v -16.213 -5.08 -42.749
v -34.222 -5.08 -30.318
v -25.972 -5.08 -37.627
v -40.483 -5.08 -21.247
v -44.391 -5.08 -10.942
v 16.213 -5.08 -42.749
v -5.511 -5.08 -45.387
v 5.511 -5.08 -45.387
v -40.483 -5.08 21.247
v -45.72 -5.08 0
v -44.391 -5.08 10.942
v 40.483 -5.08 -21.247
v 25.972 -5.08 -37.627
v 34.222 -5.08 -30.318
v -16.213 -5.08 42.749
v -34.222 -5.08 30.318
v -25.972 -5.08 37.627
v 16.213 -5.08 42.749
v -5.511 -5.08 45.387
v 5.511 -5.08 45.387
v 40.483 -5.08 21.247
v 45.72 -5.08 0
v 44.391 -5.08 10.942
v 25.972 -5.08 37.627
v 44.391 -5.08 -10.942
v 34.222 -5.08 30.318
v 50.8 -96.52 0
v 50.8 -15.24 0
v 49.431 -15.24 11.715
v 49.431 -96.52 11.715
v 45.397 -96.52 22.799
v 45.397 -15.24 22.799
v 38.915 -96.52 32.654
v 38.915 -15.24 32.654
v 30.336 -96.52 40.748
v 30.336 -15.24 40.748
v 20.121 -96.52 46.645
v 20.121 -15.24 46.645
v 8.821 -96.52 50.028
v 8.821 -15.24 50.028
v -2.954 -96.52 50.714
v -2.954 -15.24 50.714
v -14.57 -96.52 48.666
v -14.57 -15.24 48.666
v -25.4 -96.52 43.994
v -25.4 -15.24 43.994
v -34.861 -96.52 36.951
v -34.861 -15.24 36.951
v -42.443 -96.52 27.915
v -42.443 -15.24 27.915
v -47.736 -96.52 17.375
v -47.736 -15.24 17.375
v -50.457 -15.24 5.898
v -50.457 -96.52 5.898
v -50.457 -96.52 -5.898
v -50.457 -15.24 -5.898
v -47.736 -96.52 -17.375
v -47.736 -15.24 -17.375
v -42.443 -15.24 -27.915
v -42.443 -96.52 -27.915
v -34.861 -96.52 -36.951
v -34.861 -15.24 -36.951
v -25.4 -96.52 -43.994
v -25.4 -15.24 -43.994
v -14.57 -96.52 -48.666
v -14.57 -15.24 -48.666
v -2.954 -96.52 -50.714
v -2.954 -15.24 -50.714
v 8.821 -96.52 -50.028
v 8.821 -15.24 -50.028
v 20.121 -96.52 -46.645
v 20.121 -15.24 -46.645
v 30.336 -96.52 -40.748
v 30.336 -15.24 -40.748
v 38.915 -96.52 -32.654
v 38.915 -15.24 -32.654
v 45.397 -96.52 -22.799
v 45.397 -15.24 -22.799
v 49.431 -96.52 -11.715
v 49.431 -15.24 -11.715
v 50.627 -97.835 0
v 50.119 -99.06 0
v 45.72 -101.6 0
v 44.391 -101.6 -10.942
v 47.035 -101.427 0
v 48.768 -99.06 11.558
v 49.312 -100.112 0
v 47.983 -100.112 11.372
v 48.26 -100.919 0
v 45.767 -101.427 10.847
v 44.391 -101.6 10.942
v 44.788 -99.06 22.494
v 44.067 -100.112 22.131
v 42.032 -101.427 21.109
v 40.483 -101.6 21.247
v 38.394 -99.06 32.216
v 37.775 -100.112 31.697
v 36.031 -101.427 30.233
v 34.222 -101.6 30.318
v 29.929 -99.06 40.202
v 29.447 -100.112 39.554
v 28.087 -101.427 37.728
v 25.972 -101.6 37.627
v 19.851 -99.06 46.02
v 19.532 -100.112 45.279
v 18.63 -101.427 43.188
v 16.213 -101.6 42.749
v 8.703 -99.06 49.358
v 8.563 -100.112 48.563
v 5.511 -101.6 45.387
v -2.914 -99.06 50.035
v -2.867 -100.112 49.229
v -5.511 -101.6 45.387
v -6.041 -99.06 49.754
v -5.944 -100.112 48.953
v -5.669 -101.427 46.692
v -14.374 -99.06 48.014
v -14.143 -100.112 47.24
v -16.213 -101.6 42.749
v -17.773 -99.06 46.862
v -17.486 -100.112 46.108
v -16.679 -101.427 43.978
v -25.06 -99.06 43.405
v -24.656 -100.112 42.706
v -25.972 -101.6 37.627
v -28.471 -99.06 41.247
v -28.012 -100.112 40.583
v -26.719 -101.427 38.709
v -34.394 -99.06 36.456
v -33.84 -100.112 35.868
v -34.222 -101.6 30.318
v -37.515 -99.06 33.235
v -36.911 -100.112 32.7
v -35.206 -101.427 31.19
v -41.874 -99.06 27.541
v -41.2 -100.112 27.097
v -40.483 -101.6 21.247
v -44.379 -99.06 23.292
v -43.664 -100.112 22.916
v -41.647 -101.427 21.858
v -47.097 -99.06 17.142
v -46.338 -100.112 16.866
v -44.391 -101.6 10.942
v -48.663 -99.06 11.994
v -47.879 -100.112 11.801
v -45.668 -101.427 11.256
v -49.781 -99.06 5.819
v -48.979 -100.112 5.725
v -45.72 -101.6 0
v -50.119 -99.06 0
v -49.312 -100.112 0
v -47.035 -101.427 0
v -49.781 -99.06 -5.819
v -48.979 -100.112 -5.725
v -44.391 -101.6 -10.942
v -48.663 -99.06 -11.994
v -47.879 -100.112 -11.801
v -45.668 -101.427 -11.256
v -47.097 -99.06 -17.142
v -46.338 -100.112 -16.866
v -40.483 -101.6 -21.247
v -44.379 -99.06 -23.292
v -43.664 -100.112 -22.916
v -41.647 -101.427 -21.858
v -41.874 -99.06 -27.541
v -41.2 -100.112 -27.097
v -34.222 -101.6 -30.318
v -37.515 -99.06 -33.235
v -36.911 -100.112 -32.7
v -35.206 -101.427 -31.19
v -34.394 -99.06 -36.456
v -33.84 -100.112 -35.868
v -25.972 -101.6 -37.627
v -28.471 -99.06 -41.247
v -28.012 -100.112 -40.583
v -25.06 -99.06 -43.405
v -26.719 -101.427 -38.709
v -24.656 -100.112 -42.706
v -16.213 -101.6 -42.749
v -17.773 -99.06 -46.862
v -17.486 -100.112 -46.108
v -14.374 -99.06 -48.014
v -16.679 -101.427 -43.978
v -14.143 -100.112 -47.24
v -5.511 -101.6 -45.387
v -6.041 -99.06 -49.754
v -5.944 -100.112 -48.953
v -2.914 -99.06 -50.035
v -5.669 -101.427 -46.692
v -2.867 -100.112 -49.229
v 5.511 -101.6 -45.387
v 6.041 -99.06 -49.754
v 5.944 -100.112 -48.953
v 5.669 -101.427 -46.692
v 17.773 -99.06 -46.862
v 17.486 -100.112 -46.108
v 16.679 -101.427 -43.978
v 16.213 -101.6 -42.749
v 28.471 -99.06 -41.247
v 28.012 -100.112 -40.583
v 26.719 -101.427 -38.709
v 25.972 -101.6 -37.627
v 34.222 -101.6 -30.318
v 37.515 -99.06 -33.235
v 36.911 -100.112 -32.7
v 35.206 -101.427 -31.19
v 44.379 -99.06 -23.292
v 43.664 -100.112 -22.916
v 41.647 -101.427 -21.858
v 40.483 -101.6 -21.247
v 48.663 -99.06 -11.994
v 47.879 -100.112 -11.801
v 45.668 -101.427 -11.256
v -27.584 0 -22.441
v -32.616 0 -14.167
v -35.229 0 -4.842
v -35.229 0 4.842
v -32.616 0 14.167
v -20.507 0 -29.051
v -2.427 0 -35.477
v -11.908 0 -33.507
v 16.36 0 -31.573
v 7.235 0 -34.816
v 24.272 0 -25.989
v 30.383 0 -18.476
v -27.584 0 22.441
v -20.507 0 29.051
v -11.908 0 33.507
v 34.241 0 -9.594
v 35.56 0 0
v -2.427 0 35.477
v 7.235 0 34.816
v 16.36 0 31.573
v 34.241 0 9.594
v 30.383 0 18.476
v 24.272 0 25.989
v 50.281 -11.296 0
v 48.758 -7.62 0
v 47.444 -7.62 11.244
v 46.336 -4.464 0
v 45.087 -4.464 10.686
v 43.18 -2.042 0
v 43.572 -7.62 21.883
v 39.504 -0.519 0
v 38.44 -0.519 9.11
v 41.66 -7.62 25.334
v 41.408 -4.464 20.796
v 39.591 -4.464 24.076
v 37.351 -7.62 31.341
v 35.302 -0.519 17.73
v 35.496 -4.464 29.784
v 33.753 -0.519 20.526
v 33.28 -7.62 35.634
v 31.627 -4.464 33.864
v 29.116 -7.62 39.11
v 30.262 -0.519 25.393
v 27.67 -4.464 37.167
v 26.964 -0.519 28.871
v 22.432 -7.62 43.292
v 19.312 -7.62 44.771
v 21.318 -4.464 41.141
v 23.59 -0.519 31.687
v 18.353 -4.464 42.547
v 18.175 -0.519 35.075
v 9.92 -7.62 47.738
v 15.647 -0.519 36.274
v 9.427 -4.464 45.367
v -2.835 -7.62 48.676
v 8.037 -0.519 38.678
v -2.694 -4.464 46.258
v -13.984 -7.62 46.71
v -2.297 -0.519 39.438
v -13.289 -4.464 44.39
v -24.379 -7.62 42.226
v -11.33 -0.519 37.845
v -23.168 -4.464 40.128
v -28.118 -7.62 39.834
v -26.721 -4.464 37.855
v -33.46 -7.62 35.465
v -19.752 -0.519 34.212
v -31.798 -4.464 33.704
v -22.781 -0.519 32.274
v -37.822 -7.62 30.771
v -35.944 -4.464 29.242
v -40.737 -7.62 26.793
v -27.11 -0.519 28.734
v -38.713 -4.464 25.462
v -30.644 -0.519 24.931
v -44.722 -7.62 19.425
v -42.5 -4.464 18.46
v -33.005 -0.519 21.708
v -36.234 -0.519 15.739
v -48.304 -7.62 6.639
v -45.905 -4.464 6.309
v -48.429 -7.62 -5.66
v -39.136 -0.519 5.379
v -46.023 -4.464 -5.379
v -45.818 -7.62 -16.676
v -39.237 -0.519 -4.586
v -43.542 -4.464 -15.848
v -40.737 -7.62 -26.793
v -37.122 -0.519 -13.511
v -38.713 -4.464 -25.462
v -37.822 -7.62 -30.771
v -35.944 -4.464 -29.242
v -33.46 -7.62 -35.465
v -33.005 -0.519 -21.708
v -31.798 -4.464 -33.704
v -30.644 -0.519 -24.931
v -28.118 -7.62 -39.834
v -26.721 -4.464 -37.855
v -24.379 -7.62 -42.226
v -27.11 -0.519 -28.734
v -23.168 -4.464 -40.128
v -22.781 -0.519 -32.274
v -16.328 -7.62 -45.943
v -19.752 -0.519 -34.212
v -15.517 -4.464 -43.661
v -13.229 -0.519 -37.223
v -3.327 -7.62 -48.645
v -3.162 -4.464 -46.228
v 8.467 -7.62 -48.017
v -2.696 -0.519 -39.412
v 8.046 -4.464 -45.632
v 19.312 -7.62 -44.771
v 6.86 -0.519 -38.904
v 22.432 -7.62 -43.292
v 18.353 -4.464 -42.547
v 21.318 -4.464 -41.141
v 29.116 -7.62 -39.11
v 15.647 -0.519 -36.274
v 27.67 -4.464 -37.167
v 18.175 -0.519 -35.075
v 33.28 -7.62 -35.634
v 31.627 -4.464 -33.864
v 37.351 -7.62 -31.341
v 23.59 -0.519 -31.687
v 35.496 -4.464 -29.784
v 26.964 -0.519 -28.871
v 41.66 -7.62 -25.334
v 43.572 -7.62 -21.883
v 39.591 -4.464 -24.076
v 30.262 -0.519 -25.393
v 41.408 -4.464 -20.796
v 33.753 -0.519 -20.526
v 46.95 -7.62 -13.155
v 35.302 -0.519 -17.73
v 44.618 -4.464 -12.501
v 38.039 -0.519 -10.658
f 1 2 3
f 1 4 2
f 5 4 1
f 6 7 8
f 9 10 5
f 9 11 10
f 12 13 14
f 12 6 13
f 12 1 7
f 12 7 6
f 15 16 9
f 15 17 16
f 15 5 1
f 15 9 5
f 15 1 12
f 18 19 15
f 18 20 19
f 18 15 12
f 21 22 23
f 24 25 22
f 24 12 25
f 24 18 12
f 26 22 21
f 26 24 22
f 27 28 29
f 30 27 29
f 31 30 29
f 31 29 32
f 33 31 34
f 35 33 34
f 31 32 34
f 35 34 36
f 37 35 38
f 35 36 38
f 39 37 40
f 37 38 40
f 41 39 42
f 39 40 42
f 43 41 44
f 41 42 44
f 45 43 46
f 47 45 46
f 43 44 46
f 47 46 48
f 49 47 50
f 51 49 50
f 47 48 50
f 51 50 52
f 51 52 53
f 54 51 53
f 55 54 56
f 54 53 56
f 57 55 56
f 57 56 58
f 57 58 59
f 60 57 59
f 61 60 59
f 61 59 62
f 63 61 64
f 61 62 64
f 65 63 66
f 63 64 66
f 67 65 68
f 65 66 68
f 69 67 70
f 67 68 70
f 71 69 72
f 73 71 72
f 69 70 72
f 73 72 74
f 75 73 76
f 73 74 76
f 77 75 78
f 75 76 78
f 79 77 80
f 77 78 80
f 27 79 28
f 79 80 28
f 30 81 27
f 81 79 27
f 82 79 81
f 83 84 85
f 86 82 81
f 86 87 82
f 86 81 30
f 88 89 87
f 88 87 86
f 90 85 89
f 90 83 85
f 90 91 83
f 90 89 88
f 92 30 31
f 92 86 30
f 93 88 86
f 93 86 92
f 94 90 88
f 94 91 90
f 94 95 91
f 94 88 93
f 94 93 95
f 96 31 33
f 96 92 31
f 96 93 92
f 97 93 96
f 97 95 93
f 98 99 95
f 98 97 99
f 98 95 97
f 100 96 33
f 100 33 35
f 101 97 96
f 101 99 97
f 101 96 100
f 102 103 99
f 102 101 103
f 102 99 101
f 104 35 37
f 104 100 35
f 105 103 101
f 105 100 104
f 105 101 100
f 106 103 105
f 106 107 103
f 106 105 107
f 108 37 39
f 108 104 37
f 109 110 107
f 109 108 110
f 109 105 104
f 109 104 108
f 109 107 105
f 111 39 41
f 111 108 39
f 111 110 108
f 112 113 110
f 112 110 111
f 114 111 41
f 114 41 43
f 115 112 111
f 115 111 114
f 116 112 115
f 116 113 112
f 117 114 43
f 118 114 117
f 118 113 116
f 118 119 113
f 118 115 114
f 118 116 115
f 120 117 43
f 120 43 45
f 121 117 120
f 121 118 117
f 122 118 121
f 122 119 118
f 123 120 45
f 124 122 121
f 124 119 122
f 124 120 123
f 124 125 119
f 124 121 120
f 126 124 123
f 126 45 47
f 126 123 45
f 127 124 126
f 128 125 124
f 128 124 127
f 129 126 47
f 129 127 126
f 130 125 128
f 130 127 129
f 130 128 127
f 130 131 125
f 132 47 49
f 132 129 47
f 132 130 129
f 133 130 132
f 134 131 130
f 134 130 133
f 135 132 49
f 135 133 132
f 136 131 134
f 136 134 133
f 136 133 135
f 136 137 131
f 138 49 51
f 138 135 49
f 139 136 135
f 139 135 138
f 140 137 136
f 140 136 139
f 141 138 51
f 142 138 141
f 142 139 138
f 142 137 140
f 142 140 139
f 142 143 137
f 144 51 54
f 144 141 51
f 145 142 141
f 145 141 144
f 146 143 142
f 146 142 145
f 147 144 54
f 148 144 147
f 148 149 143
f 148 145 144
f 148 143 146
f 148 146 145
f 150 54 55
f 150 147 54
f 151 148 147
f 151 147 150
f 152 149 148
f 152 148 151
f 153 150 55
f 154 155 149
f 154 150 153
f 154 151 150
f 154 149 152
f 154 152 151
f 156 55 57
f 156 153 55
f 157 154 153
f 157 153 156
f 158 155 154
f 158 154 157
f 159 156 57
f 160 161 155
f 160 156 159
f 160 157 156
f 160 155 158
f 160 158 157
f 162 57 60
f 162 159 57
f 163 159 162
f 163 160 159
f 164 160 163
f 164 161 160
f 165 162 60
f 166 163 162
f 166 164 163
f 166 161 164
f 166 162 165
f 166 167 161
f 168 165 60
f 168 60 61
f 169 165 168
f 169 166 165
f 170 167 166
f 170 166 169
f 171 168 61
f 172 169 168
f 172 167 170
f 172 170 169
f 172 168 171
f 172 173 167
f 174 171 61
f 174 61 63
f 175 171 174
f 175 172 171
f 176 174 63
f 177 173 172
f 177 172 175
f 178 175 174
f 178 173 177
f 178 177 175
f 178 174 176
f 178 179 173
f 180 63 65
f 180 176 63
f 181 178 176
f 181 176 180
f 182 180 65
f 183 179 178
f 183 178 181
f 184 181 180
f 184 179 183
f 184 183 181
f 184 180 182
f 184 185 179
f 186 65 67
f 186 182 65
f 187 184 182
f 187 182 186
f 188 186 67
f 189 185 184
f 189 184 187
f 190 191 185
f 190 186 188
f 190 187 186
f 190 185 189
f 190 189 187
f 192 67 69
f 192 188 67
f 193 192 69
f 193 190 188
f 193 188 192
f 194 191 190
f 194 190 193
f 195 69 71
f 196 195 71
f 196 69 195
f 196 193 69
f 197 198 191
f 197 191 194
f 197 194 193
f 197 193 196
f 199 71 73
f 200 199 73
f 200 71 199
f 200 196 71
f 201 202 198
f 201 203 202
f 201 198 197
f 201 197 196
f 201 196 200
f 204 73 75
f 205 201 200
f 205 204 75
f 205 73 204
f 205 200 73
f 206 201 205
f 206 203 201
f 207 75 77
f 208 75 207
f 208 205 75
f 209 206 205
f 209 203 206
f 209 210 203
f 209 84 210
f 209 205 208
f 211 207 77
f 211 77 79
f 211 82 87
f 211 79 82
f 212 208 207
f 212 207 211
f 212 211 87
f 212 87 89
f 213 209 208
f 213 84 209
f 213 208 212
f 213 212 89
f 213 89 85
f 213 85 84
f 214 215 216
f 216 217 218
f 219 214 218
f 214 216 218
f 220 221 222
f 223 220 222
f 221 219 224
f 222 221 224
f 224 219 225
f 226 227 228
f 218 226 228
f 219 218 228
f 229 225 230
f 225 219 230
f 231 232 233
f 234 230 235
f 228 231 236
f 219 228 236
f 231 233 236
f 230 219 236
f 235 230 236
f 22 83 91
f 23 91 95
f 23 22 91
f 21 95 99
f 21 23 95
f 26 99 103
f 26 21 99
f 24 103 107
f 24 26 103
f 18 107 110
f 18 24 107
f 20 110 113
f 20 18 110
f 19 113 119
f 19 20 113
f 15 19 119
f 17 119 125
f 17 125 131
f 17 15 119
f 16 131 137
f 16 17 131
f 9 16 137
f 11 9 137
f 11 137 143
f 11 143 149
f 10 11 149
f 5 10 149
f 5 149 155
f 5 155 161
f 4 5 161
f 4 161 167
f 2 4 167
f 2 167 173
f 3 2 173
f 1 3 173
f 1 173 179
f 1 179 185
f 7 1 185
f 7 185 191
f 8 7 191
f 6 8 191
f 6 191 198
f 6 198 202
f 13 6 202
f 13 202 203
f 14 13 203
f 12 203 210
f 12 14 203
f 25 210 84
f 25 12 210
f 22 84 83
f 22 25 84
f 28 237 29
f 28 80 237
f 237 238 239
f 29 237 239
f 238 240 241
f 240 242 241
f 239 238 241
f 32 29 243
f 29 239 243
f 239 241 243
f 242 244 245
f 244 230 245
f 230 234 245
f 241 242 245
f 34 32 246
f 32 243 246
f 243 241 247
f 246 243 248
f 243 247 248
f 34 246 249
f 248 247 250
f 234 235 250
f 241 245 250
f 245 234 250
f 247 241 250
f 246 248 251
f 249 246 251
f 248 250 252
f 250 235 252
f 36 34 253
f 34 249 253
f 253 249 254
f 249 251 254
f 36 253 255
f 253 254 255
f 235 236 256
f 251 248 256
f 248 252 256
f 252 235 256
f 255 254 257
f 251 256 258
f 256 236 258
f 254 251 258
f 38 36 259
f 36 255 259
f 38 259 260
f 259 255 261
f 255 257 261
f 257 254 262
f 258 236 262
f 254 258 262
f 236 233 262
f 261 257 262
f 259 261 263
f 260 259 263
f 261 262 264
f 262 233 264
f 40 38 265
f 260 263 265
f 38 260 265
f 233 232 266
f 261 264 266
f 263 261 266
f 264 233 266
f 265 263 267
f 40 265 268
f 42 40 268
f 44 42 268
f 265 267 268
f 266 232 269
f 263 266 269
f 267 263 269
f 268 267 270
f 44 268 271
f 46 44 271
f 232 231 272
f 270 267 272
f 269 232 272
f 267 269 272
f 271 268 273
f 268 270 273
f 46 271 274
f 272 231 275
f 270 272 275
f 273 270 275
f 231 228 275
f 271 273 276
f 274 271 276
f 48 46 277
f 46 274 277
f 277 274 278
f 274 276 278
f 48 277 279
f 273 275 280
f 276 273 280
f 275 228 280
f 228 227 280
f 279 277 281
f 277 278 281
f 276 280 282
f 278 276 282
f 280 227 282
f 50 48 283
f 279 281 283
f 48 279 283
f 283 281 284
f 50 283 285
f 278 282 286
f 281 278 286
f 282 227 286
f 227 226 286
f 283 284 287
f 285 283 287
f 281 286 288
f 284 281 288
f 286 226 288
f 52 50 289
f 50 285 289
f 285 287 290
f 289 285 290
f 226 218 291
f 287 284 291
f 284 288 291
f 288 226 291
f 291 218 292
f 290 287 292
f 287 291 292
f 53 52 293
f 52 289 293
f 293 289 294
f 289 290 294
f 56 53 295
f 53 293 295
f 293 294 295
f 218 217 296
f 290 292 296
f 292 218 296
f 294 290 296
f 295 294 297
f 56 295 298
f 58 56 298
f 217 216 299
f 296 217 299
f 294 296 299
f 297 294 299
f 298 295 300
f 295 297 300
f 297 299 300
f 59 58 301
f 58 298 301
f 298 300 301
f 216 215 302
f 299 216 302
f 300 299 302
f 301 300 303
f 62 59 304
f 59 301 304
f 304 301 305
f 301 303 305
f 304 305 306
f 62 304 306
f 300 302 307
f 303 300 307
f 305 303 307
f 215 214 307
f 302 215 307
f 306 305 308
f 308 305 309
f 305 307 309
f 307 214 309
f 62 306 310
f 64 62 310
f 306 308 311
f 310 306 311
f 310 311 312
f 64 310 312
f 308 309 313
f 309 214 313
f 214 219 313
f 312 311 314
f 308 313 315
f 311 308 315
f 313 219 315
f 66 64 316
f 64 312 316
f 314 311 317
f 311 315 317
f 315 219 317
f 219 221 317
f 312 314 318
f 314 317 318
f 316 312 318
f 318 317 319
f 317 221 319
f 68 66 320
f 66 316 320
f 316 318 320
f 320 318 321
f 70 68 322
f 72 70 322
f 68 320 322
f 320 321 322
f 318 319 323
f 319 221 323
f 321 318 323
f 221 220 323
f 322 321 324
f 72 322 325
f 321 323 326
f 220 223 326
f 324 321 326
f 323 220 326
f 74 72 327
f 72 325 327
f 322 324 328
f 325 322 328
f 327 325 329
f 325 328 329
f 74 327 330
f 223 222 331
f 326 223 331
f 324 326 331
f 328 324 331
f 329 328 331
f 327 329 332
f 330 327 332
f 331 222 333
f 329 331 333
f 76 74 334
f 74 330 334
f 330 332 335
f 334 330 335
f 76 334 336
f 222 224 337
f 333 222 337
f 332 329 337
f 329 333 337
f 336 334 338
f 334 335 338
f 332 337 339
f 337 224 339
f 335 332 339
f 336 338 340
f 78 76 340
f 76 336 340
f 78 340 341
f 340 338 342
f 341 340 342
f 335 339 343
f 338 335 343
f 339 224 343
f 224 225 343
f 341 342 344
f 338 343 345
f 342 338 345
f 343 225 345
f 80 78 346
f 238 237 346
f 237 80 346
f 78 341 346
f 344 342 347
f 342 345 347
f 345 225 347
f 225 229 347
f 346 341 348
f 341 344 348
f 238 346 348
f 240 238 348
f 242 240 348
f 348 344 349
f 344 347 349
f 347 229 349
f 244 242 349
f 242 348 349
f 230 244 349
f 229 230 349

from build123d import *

# Parameters (mm, degrees)
F0_R     = 50.8
F1_DEPTH = 101.6
F2_T     = -5.08
F3_R     = 15.24
F4_R     = 5.07999


# Not quite as in the source:
# - a fillet or chamfer is up to 0.001 mm smaller than in the source, because OpenCascade refuses the exact size


with BuildPart() as f1:
    # F0 (on Front) → F1 (new body)
    with BuildSketch(Plane.XZ):
        Circle(F0_R)
    extrude(amount=F1_DEPTH)

    # F2
    f2_openings = [f1.faces().sort_by_distance(p)[0] for p in [
        (0, -101.6, 0),
    ]]
    offset(amount=F2_T, openings=f2_openings)

    # F3
    f3_edges = [f1.edges().sort_by_distance(p)[0] for p in [
        (-50.8, 0, 0),
    ]]
    fillet(f3_edges, radius=F3_R)

    # F4 (radius 5.08 in the source; OpenCascade refuses exactly that, so slightly less here)
    f4_edges = [f1.edges().sort_by_distance(p)[0] for p in [
        (-50.8, -101.6, 0),
    ]]
    fillet(f4_edges, radius=F4_R)


solid = f1.part
